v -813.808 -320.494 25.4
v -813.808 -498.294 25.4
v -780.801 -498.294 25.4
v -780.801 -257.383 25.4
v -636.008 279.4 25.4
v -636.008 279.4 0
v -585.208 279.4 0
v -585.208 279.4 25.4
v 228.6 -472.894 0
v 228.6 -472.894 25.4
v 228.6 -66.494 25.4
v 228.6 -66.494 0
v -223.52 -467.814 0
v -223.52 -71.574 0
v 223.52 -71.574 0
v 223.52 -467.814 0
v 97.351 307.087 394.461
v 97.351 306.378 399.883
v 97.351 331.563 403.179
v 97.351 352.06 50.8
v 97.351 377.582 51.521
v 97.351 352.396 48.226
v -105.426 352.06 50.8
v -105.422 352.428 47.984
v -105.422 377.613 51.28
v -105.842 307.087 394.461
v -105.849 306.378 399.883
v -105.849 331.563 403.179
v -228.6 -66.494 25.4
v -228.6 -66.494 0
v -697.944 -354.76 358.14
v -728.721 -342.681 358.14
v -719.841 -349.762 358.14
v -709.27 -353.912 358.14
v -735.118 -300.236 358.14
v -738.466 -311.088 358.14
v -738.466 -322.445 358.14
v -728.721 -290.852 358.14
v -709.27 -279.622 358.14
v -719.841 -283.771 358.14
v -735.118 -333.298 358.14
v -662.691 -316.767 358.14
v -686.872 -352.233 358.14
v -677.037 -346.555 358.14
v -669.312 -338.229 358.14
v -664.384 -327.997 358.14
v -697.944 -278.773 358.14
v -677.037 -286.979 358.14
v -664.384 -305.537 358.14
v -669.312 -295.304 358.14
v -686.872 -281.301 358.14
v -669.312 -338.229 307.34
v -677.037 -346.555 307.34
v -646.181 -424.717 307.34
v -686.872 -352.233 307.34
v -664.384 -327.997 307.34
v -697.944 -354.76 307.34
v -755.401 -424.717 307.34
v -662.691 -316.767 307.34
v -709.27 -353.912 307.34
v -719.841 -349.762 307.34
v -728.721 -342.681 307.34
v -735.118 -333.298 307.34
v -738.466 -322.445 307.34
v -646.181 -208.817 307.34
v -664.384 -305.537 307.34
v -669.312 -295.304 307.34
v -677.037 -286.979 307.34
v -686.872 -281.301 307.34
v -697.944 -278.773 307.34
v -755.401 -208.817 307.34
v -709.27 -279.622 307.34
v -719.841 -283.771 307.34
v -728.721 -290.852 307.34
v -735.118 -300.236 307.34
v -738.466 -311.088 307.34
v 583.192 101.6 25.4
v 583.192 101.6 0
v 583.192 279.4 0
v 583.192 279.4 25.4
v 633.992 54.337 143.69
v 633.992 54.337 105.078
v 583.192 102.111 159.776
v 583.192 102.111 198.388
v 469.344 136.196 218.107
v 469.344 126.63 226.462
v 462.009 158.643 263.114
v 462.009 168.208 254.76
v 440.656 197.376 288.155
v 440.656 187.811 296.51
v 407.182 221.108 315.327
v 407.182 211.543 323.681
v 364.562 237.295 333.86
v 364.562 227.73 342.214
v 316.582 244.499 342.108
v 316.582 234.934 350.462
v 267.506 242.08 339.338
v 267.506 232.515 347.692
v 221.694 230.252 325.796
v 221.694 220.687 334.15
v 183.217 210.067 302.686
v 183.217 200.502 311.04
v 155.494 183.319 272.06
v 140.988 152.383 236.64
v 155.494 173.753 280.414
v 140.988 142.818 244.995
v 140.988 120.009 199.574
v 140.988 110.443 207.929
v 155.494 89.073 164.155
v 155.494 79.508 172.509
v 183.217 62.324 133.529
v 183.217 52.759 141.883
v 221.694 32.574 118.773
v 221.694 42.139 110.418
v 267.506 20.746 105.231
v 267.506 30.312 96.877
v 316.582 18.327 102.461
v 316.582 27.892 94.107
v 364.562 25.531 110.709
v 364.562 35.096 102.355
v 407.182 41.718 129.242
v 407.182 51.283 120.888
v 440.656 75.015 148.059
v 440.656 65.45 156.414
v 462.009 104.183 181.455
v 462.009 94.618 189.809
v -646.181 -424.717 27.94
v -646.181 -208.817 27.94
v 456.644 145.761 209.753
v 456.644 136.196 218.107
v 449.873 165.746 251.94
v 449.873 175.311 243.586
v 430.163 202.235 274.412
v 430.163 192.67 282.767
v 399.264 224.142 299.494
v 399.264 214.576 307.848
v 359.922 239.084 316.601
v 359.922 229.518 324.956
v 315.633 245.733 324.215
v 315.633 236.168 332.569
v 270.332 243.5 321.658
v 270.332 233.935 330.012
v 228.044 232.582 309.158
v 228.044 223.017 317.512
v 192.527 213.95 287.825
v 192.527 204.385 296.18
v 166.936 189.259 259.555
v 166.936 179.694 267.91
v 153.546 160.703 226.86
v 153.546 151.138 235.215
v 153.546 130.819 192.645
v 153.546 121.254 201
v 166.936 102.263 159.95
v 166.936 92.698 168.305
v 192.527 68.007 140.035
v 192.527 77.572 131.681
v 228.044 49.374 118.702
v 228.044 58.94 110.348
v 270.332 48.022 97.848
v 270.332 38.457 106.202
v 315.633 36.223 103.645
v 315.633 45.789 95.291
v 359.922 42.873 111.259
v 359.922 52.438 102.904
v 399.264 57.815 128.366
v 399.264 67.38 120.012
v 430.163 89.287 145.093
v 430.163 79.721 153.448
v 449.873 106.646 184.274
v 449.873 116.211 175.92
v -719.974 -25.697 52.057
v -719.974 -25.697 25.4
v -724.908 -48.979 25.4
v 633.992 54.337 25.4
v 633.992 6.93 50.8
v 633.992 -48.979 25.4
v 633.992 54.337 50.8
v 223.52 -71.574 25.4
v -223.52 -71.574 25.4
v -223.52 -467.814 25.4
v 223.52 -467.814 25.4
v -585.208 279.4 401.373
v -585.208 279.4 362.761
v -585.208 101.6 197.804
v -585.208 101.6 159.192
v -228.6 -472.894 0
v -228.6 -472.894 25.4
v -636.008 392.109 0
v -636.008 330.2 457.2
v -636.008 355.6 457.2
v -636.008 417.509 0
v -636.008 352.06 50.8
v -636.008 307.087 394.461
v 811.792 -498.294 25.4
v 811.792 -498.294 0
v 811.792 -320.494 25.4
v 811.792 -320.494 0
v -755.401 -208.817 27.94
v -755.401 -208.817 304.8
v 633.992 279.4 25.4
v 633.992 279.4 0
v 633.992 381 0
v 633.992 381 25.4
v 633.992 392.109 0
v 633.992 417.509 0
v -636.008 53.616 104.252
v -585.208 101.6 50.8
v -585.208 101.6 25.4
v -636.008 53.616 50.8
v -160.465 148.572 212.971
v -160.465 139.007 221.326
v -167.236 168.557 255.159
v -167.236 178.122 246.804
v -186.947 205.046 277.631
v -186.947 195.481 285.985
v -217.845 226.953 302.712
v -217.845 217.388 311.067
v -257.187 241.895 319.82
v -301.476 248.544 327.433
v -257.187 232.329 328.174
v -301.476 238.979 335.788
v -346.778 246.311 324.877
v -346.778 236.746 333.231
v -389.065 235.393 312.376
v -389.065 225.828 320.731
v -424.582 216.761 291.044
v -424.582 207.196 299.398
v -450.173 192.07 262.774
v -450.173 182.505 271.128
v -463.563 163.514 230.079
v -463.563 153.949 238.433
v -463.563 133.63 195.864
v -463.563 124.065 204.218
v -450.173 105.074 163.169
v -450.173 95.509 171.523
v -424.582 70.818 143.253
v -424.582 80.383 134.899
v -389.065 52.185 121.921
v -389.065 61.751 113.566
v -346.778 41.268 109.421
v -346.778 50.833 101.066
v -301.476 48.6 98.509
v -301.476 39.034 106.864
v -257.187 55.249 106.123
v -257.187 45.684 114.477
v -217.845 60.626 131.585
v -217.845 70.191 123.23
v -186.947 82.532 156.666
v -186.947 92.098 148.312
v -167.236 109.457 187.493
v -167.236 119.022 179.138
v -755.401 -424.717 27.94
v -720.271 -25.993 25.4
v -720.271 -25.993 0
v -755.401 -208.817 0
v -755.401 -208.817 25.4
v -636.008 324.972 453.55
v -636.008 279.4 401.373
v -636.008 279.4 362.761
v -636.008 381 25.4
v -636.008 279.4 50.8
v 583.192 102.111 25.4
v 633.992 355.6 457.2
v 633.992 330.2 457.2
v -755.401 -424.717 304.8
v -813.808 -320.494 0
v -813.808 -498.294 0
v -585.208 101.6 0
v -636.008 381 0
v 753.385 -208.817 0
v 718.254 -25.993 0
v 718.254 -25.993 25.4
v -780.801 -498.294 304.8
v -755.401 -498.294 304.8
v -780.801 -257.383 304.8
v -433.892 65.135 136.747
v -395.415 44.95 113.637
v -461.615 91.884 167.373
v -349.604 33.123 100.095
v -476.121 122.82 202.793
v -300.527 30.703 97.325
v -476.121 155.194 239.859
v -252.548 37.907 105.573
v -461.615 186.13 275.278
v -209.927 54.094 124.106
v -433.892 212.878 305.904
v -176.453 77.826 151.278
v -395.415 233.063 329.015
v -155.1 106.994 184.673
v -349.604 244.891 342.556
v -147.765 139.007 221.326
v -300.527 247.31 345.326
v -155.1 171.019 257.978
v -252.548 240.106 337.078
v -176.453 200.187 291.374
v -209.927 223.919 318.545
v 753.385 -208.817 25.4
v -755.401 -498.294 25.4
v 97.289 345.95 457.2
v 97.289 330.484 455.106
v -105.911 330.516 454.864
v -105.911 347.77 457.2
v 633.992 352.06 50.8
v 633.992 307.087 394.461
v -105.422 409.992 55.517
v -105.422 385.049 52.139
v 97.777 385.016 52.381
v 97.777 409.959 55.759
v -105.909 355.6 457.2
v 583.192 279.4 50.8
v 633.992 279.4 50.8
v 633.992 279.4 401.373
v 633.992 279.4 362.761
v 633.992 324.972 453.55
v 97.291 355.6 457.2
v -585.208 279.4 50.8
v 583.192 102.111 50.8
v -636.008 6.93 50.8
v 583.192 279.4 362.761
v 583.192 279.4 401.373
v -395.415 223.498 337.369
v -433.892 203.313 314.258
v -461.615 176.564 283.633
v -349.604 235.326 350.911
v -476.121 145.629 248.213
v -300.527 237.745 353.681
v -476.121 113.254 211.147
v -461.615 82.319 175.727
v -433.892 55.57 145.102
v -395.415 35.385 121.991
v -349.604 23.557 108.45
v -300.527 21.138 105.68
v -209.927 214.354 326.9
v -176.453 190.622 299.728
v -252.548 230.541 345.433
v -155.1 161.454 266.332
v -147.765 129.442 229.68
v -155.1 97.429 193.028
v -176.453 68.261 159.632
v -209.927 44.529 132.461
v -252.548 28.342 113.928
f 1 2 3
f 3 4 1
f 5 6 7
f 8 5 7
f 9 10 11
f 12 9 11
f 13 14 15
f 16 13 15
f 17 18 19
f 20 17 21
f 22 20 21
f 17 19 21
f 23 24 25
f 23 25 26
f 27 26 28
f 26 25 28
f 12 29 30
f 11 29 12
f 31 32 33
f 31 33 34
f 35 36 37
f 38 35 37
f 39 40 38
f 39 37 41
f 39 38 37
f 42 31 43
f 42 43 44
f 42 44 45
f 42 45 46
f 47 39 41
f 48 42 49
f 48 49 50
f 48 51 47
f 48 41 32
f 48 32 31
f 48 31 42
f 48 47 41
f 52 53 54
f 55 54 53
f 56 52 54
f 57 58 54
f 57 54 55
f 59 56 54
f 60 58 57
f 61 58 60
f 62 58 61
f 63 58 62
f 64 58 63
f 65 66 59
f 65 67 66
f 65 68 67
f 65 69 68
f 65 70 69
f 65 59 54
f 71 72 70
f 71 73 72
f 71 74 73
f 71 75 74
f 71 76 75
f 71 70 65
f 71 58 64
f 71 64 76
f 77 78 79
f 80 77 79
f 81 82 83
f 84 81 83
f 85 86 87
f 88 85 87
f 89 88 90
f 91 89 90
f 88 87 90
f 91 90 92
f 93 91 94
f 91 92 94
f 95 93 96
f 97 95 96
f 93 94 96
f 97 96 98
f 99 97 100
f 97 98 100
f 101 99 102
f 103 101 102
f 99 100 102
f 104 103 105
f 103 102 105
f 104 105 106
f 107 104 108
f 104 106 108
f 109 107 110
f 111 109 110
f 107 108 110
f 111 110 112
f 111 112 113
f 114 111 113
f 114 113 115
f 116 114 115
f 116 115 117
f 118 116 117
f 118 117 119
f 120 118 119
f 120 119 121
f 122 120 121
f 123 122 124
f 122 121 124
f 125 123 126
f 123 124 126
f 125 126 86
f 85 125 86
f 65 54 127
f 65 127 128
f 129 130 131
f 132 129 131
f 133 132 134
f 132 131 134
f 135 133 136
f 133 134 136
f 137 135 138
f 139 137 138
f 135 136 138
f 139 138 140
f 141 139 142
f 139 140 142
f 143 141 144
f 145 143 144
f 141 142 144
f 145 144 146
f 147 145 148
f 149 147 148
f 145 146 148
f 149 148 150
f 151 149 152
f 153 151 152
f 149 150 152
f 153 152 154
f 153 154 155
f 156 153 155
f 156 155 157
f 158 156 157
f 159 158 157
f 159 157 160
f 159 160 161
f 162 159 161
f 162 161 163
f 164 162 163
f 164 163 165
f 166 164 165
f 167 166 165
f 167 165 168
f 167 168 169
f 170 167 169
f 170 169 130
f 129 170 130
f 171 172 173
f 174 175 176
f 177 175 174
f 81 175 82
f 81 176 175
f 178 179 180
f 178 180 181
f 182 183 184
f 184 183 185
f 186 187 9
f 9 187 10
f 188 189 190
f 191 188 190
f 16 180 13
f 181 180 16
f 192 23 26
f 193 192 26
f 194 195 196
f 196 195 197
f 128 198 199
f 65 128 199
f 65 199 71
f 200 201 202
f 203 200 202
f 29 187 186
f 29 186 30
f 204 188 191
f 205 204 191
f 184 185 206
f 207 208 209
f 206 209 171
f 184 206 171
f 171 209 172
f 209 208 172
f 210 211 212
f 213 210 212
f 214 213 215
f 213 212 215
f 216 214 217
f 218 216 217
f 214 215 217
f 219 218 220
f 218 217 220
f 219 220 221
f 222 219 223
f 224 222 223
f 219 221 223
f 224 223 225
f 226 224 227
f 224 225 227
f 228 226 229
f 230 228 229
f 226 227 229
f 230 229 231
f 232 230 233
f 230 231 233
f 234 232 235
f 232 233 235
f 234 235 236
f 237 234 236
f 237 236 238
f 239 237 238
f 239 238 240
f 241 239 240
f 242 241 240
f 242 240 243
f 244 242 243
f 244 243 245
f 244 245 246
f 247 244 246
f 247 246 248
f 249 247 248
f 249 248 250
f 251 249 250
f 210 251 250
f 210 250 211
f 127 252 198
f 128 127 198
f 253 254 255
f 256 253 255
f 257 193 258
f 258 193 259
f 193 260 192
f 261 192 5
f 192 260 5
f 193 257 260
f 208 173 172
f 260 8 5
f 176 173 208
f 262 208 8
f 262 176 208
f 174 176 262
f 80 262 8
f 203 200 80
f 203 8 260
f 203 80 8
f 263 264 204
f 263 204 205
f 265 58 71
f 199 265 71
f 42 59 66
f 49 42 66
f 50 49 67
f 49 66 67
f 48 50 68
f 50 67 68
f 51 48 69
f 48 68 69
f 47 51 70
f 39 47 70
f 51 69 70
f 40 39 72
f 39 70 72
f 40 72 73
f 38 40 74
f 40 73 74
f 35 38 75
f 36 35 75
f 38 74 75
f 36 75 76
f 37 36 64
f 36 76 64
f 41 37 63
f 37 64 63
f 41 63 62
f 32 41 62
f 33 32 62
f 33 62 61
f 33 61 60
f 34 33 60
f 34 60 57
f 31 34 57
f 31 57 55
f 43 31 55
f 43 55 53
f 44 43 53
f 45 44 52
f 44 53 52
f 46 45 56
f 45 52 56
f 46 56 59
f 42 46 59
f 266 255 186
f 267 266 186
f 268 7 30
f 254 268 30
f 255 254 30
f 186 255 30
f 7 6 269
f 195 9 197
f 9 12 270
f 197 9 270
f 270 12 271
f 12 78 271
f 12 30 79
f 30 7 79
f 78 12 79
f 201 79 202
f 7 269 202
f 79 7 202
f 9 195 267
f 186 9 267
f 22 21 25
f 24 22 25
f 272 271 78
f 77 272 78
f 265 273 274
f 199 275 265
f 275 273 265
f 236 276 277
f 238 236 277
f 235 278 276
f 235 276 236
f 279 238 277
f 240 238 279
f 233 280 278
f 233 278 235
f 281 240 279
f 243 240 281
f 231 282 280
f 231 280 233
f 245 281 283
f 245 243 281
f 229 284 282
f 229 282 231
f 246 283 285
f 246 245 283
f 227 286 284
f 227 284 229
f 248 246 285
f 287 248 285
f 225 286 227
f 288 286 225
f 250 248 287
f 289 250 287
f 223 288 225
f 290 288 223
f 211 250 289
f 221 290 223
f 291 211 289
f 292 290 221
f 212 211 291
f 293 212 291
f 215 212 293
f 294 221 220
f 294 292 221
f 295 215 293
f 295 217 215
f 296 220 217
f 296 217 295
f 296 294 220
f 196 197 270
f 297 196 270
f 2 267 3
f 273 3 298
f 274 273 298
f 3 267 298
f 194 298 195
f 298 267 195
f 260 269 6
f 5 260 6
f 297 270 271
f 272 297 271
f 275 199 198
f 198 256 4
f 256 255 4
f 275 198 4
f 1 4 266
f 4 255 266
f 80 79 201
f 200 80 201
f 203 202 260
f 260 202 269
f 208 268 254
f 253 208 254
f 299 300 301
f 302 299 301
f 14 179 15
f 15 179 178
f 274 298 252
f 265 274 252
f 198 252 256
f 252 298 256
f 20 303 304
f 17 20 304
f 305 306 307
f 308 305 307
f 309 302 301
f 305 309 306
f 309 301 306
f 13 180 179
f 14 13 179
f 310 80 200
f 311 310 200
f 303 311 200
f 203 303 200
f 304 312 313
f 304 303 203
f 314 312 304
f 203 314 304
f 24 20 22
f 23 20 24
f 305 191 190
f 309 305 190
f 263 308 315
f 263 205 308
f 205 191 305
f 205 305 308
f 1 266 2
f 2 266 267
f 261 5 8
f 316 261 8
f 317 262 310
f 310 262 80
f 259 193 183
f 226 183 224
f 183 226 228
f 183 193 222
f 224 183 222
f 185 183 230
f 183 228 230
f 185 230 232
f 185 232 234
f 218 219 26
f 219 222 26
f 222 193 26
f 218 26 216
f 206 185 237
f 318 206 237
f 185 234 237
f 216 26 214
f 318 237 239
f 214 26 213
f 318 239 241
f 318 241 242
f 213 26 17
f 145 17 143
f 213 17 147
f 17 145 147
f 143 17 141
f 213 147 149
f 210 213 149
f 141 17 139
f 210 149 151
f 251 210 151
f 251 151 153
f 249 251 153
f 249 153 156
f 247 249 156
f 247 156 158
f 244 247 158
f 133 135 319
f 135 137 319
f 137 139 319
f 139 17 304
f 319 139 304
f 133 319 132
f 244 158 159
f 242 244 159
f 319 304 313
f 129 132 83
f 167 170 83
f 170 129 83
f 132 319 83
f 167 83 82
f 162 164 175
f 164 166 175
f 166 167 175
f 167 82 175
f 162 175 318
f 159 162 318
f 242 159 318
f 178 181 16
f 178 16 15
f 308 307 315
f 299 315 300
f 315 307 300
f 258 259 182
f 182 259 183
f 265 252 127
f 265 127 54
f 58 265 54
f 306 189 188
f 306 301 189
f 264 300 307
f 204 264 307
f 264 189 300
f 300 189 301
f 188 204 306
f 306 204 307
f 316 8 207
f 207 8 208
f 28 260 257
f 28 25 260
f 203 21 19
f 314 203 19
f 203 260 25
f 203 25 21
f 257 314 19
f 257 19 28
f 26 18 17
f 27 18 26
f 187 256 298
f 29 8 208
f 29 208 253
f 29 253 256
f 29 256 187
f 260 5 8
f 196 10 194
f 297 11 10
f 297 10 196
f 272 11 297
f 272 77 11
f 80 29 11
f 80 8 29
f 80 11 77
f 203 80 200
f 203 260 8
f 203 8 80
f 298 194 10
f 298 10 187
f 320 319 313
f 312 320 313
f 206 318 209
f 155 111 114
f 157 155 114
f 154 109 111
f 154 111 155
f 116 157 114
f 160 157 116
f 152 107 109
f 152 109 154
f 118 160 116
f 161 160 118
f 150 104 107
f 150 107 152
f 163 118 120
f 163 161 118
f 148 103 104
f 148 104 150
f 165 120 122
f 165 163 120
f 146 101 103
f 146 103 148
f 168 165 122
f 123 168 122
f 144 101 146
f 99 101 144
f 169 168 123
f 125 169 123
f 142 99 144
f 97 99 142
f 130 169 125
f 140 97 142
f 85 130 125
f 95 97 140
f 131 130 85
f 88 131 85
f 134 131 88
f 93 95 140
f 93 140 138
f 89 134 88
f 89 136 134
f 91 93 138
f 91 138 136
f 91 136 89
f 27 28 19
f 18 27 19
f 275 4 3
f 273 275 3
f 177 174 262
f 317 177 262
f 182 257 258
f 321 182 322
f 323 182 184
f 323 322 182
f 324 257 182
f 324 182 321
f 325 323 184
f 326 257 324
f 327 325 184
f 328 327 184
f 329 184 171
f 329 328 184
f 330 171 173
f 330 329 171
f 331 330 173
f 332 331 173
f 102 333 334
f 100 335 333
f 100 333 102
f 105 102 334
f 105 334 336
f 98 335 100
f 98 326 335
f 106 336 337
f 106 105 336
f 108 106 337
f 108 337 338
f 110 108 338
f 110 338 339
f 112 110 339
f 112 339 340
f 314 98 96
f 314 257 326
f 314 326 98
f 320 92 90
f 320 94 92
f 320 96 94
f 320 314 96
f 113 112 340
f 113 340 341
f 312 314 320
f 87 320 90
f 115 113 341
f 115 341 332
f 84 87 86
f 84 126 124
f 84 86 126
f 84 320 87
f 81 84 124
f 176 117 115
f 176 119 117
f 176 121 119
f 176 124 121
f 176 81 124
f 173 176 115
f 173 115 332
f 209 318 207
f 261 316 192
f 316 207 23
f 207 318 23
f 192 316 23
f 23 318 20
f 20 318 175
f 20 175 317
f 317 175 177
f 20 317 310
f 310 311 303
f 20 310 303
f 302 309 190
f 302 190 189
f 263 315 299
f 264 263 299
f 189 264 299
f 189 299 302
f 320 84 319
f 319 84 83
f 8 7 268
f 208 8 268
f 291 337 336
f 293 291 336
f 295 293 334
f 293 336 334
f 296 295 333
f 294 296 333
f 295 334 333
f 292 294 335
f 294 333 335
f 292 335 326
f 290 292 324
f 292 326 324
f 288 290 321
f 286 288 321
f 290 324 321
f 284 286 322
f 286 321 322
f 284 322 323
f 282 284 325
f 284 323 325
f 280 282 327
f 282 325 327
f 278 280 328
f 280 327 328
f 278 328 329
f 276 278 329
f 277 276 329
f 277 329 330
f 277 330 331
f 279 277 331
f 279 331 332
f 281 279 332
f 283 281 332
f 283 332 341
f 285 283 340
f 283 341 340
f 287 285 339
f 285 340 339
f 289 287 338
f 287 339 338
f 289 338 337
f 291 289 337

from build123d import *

# Parameters (mm, degrees)
F1_DEPTH  = 25.4
F3_DEPTH  = 1270
F5_DEPTH  = 25.4
F6_W      = 457.2
F6_H      = 406.4
F7_DEPTH  = 25.4
F8_W      = 447.04
F8_H      = 396.24
F9_DEPTH  = 25.4
F11_DEPTH = 1358.9
F12_R     = 165.1
F13_DEPTH = 12.7
F15_DEPTH = 1270
F17_DEPTH = 25.4
F18_R     = 152.4
F19_DEPTH = 25.4
F21_DEPTH = 508
F23_DEPTH = 279.4
F24_W     = 215.9
F24_H     = 279.4
F25_DEPTH = 109.22
F26_R     = 38.1
F27_DEPTH = 50.8


with BuildPart() as f1:
    # F0 (on Top) → F1 (new body)
    with BuildSketch(Plane.XY):
        Polygon((633.9916200739, 381), (-636.0083799261, 381), (-636.0083799261, 279.4), (-585.2083799261, 279.4), (-585.2083799261, 101.6), (-720.2711577423, -25.9932654437), (-755.401483878, -208.8168415053), (-813.8083799261, -320.4935488224), (-813.8083799261, -498.2935488224), (-636.0083799261, -498.2935488224), (633.9916200739, -498.2935488224), (811.7916200739, -498.2935488224), (811.7916200739, -320.4935488224), (753.3847240259, -208.8168415053), (718.2543978901, -25.9932654437), (583.1916200739, 101.6), (583.1916200739, 279.4), (633.9916200739, 279.4), align=None)
    extrude(amount=F1_DEPTH)

    # F6 (on face) → F7 (cut)
    with BuildSketch(Plane.XY.offset(25.4)):
        with Locations((0, -269.6935488224)):
            Rectangle(F6_W, F6_H)
    extrude(amount=-F7_DEPTH, mode=Mode.SUBTRACT)

    # F22 (on face) → F23 (join)
    with BuildSketch(Plane.XY.offset(25.4)):
        Polygon((-755.401483878, -498.2935488224), (-755.401483878, -208.8168415053), (-780.801483878, -257.3828252809), (-780.801483878, -498.2935488224), align=None)
    extrude(amount=F23_DEPTH)

    # F24 (on face) → F25 (join)
    with BuildSketch(Plane.YZ.offset(-755.401483878)):
        with Locations((-316.7668415053, 167.64)):
            Rectangle(F24_W, F24_H)
    extrude(amount=F25_DEPTH)

    # F26 (on face) → F27 (join)
    with BuildSketch(Plane.XY.offset(307.34)):
        with Locations((-700.791483878, -316.7668415053)):
            Circle(F26_R)
    extrude(amount=F27_DEPTH)


with BuildPart() as f3:
    # F2 (on face) → F3 (new body)
    with BuildSketch(Plane.YZ.offset(633.9916200739)):
        Polygon((355.6, 457.2), (330.2, 457.2), (392.1093138361, 0), (417.5093138361, 0), align=None)
    extrude(amount=-F3_DEPTH)

    # F4 (on face) → F5 (cut)
    with BuildSketch(Plane(origin=(0, 385.0491351938, 52.1393870364), x_dir=(1, 0, 0), z_dir=(0, -0.9909562863, -0.1341850913))):
        Polygon((97.7774903124, 0.2441267287), (97.289236855, 406.6438334321), (-4.3187378932, 406.5217603986), (-4.3187378932, 0.1214671018), align=None)
        Polygon((-4.3187378932, 0.1214671018), (-4.3187378932, 406.5217603986), (-105.9106164967, 406.3997067033), (-105.4223630393, 0), align=None)
    extrude(amount=-F5_DEPTH, mode=Mode.SUBTRACT)


with BuildPart() as f9:
    # F8 (on face) → F9 (new body)
    with BuildSketch(Plane.XY.offset(25.4)):
        with Locations((0, -269.6935488224)):
            Rectangle(F8_W, F8_H)
    extrude(amount=-F9_DEPTH)


with BuildPart() as f11:
    # F10 (on face) → F11 (new body)
    with BuildSketch(Plane.YZ.offset(633.9916200739)):
        Polygon((137.9962750452, 239.4747816958), (381, 25.4), (324.9715128924, 453.5495633916), align=None)
        Polygon((-48.9789628019, 25.4), (381, 25.4), (137.9962750452, 239.4747816958), align=None)
    extrude(amount=-F11_DEPTH)

    # F12 (on face) → F13 (cut)
    with BuildSketch(Plane(origin=(0, -40.3685730448, 35.2583498477), x_dir=(1, 0, 0), z_dir=(0, -0.7531695417, 0.6578264524))):
        with Locations((304.2439635869, 253.8648922865)):
            Circle(F12_R)
        with Locations((-312.8653432209, 258.1381852401)):
            Circle(F12_R)
    extrude(amount=-F13_DEPTH, mode=Mode.SUBTRACT)

    # F14 (on face) → F15 (cut)
    with BuildSketch(Plane.YZ.offset(633.9916200739)):
        Polygon((352.0595440659, 50.8), (307.0873524009, 394.4613269455), (6.9298194327, 50.8), align=None)
    extrude(amount=-F15_DEPTH, mode=Mode.SUBTRACT)

    # F16 (on face) → F17 (cut)
    with BuildSketch(Plane(origin=(0, 377.8532138761, 49.446608691), x_dir=(-1, 0, 0), z_dir=(0, 0.9915460014, 0.1297556441))):
        Polygon((105.8487479012, 356.7483680457), (-97.3513987472, 356.7483680457), (-97.3513987472, 2.0923885114), (105.4223630393, 1.8487761264), align=None)
    extrude(amount=-F17_DEPTH, mode=Mode.SUBTRACT)

    # F18 (on face) → F19 (cut)
    with BuildSketch(Plane(origin=(0, -30.8033198656, 26.9039539021), x_dir=(1, 0, 0), z_dir=(0, -0.7531695417, 0.6578264524))):
        with Locations((304.2439635869, 253.8648922865)):
            Circle(F18_R)
        with Locations((-312.8653432209, 258.1381852401)):
            Circle(F18_R)
    extrude(amount=-F19_DEPTH, mode=Mode.SUBTRACT)

    # F20 (on face) → F21 (cut)
    with BuildSketch(Plane(origin=(0, 0, 25.4), x_dir=(1, 0, 0), z_dir=(0, 0, -1))):
        Polygon((583.1916200739, -102.1105647087), (583.1916200739, -279.4), (633.9916200739, -279.4), (633.9916200739, -54.3372150012), align=None)
        Polygon((-636.0083799261, -381), (-636.0083799261, -279.4), (-585.2083799261, -279.4), (-585.2083799261, -101.6003191471), (-719.9740735159, 25.6968111728), (-724.9083799261, 48.9789628019), (-724.9083799261, -381), align=None)
    extrude(amount=-F21_DEPTH, mode=Mode.SUBTRACT)


solid = Compound([f1.part, f3.part, f9.part, f11.part])
